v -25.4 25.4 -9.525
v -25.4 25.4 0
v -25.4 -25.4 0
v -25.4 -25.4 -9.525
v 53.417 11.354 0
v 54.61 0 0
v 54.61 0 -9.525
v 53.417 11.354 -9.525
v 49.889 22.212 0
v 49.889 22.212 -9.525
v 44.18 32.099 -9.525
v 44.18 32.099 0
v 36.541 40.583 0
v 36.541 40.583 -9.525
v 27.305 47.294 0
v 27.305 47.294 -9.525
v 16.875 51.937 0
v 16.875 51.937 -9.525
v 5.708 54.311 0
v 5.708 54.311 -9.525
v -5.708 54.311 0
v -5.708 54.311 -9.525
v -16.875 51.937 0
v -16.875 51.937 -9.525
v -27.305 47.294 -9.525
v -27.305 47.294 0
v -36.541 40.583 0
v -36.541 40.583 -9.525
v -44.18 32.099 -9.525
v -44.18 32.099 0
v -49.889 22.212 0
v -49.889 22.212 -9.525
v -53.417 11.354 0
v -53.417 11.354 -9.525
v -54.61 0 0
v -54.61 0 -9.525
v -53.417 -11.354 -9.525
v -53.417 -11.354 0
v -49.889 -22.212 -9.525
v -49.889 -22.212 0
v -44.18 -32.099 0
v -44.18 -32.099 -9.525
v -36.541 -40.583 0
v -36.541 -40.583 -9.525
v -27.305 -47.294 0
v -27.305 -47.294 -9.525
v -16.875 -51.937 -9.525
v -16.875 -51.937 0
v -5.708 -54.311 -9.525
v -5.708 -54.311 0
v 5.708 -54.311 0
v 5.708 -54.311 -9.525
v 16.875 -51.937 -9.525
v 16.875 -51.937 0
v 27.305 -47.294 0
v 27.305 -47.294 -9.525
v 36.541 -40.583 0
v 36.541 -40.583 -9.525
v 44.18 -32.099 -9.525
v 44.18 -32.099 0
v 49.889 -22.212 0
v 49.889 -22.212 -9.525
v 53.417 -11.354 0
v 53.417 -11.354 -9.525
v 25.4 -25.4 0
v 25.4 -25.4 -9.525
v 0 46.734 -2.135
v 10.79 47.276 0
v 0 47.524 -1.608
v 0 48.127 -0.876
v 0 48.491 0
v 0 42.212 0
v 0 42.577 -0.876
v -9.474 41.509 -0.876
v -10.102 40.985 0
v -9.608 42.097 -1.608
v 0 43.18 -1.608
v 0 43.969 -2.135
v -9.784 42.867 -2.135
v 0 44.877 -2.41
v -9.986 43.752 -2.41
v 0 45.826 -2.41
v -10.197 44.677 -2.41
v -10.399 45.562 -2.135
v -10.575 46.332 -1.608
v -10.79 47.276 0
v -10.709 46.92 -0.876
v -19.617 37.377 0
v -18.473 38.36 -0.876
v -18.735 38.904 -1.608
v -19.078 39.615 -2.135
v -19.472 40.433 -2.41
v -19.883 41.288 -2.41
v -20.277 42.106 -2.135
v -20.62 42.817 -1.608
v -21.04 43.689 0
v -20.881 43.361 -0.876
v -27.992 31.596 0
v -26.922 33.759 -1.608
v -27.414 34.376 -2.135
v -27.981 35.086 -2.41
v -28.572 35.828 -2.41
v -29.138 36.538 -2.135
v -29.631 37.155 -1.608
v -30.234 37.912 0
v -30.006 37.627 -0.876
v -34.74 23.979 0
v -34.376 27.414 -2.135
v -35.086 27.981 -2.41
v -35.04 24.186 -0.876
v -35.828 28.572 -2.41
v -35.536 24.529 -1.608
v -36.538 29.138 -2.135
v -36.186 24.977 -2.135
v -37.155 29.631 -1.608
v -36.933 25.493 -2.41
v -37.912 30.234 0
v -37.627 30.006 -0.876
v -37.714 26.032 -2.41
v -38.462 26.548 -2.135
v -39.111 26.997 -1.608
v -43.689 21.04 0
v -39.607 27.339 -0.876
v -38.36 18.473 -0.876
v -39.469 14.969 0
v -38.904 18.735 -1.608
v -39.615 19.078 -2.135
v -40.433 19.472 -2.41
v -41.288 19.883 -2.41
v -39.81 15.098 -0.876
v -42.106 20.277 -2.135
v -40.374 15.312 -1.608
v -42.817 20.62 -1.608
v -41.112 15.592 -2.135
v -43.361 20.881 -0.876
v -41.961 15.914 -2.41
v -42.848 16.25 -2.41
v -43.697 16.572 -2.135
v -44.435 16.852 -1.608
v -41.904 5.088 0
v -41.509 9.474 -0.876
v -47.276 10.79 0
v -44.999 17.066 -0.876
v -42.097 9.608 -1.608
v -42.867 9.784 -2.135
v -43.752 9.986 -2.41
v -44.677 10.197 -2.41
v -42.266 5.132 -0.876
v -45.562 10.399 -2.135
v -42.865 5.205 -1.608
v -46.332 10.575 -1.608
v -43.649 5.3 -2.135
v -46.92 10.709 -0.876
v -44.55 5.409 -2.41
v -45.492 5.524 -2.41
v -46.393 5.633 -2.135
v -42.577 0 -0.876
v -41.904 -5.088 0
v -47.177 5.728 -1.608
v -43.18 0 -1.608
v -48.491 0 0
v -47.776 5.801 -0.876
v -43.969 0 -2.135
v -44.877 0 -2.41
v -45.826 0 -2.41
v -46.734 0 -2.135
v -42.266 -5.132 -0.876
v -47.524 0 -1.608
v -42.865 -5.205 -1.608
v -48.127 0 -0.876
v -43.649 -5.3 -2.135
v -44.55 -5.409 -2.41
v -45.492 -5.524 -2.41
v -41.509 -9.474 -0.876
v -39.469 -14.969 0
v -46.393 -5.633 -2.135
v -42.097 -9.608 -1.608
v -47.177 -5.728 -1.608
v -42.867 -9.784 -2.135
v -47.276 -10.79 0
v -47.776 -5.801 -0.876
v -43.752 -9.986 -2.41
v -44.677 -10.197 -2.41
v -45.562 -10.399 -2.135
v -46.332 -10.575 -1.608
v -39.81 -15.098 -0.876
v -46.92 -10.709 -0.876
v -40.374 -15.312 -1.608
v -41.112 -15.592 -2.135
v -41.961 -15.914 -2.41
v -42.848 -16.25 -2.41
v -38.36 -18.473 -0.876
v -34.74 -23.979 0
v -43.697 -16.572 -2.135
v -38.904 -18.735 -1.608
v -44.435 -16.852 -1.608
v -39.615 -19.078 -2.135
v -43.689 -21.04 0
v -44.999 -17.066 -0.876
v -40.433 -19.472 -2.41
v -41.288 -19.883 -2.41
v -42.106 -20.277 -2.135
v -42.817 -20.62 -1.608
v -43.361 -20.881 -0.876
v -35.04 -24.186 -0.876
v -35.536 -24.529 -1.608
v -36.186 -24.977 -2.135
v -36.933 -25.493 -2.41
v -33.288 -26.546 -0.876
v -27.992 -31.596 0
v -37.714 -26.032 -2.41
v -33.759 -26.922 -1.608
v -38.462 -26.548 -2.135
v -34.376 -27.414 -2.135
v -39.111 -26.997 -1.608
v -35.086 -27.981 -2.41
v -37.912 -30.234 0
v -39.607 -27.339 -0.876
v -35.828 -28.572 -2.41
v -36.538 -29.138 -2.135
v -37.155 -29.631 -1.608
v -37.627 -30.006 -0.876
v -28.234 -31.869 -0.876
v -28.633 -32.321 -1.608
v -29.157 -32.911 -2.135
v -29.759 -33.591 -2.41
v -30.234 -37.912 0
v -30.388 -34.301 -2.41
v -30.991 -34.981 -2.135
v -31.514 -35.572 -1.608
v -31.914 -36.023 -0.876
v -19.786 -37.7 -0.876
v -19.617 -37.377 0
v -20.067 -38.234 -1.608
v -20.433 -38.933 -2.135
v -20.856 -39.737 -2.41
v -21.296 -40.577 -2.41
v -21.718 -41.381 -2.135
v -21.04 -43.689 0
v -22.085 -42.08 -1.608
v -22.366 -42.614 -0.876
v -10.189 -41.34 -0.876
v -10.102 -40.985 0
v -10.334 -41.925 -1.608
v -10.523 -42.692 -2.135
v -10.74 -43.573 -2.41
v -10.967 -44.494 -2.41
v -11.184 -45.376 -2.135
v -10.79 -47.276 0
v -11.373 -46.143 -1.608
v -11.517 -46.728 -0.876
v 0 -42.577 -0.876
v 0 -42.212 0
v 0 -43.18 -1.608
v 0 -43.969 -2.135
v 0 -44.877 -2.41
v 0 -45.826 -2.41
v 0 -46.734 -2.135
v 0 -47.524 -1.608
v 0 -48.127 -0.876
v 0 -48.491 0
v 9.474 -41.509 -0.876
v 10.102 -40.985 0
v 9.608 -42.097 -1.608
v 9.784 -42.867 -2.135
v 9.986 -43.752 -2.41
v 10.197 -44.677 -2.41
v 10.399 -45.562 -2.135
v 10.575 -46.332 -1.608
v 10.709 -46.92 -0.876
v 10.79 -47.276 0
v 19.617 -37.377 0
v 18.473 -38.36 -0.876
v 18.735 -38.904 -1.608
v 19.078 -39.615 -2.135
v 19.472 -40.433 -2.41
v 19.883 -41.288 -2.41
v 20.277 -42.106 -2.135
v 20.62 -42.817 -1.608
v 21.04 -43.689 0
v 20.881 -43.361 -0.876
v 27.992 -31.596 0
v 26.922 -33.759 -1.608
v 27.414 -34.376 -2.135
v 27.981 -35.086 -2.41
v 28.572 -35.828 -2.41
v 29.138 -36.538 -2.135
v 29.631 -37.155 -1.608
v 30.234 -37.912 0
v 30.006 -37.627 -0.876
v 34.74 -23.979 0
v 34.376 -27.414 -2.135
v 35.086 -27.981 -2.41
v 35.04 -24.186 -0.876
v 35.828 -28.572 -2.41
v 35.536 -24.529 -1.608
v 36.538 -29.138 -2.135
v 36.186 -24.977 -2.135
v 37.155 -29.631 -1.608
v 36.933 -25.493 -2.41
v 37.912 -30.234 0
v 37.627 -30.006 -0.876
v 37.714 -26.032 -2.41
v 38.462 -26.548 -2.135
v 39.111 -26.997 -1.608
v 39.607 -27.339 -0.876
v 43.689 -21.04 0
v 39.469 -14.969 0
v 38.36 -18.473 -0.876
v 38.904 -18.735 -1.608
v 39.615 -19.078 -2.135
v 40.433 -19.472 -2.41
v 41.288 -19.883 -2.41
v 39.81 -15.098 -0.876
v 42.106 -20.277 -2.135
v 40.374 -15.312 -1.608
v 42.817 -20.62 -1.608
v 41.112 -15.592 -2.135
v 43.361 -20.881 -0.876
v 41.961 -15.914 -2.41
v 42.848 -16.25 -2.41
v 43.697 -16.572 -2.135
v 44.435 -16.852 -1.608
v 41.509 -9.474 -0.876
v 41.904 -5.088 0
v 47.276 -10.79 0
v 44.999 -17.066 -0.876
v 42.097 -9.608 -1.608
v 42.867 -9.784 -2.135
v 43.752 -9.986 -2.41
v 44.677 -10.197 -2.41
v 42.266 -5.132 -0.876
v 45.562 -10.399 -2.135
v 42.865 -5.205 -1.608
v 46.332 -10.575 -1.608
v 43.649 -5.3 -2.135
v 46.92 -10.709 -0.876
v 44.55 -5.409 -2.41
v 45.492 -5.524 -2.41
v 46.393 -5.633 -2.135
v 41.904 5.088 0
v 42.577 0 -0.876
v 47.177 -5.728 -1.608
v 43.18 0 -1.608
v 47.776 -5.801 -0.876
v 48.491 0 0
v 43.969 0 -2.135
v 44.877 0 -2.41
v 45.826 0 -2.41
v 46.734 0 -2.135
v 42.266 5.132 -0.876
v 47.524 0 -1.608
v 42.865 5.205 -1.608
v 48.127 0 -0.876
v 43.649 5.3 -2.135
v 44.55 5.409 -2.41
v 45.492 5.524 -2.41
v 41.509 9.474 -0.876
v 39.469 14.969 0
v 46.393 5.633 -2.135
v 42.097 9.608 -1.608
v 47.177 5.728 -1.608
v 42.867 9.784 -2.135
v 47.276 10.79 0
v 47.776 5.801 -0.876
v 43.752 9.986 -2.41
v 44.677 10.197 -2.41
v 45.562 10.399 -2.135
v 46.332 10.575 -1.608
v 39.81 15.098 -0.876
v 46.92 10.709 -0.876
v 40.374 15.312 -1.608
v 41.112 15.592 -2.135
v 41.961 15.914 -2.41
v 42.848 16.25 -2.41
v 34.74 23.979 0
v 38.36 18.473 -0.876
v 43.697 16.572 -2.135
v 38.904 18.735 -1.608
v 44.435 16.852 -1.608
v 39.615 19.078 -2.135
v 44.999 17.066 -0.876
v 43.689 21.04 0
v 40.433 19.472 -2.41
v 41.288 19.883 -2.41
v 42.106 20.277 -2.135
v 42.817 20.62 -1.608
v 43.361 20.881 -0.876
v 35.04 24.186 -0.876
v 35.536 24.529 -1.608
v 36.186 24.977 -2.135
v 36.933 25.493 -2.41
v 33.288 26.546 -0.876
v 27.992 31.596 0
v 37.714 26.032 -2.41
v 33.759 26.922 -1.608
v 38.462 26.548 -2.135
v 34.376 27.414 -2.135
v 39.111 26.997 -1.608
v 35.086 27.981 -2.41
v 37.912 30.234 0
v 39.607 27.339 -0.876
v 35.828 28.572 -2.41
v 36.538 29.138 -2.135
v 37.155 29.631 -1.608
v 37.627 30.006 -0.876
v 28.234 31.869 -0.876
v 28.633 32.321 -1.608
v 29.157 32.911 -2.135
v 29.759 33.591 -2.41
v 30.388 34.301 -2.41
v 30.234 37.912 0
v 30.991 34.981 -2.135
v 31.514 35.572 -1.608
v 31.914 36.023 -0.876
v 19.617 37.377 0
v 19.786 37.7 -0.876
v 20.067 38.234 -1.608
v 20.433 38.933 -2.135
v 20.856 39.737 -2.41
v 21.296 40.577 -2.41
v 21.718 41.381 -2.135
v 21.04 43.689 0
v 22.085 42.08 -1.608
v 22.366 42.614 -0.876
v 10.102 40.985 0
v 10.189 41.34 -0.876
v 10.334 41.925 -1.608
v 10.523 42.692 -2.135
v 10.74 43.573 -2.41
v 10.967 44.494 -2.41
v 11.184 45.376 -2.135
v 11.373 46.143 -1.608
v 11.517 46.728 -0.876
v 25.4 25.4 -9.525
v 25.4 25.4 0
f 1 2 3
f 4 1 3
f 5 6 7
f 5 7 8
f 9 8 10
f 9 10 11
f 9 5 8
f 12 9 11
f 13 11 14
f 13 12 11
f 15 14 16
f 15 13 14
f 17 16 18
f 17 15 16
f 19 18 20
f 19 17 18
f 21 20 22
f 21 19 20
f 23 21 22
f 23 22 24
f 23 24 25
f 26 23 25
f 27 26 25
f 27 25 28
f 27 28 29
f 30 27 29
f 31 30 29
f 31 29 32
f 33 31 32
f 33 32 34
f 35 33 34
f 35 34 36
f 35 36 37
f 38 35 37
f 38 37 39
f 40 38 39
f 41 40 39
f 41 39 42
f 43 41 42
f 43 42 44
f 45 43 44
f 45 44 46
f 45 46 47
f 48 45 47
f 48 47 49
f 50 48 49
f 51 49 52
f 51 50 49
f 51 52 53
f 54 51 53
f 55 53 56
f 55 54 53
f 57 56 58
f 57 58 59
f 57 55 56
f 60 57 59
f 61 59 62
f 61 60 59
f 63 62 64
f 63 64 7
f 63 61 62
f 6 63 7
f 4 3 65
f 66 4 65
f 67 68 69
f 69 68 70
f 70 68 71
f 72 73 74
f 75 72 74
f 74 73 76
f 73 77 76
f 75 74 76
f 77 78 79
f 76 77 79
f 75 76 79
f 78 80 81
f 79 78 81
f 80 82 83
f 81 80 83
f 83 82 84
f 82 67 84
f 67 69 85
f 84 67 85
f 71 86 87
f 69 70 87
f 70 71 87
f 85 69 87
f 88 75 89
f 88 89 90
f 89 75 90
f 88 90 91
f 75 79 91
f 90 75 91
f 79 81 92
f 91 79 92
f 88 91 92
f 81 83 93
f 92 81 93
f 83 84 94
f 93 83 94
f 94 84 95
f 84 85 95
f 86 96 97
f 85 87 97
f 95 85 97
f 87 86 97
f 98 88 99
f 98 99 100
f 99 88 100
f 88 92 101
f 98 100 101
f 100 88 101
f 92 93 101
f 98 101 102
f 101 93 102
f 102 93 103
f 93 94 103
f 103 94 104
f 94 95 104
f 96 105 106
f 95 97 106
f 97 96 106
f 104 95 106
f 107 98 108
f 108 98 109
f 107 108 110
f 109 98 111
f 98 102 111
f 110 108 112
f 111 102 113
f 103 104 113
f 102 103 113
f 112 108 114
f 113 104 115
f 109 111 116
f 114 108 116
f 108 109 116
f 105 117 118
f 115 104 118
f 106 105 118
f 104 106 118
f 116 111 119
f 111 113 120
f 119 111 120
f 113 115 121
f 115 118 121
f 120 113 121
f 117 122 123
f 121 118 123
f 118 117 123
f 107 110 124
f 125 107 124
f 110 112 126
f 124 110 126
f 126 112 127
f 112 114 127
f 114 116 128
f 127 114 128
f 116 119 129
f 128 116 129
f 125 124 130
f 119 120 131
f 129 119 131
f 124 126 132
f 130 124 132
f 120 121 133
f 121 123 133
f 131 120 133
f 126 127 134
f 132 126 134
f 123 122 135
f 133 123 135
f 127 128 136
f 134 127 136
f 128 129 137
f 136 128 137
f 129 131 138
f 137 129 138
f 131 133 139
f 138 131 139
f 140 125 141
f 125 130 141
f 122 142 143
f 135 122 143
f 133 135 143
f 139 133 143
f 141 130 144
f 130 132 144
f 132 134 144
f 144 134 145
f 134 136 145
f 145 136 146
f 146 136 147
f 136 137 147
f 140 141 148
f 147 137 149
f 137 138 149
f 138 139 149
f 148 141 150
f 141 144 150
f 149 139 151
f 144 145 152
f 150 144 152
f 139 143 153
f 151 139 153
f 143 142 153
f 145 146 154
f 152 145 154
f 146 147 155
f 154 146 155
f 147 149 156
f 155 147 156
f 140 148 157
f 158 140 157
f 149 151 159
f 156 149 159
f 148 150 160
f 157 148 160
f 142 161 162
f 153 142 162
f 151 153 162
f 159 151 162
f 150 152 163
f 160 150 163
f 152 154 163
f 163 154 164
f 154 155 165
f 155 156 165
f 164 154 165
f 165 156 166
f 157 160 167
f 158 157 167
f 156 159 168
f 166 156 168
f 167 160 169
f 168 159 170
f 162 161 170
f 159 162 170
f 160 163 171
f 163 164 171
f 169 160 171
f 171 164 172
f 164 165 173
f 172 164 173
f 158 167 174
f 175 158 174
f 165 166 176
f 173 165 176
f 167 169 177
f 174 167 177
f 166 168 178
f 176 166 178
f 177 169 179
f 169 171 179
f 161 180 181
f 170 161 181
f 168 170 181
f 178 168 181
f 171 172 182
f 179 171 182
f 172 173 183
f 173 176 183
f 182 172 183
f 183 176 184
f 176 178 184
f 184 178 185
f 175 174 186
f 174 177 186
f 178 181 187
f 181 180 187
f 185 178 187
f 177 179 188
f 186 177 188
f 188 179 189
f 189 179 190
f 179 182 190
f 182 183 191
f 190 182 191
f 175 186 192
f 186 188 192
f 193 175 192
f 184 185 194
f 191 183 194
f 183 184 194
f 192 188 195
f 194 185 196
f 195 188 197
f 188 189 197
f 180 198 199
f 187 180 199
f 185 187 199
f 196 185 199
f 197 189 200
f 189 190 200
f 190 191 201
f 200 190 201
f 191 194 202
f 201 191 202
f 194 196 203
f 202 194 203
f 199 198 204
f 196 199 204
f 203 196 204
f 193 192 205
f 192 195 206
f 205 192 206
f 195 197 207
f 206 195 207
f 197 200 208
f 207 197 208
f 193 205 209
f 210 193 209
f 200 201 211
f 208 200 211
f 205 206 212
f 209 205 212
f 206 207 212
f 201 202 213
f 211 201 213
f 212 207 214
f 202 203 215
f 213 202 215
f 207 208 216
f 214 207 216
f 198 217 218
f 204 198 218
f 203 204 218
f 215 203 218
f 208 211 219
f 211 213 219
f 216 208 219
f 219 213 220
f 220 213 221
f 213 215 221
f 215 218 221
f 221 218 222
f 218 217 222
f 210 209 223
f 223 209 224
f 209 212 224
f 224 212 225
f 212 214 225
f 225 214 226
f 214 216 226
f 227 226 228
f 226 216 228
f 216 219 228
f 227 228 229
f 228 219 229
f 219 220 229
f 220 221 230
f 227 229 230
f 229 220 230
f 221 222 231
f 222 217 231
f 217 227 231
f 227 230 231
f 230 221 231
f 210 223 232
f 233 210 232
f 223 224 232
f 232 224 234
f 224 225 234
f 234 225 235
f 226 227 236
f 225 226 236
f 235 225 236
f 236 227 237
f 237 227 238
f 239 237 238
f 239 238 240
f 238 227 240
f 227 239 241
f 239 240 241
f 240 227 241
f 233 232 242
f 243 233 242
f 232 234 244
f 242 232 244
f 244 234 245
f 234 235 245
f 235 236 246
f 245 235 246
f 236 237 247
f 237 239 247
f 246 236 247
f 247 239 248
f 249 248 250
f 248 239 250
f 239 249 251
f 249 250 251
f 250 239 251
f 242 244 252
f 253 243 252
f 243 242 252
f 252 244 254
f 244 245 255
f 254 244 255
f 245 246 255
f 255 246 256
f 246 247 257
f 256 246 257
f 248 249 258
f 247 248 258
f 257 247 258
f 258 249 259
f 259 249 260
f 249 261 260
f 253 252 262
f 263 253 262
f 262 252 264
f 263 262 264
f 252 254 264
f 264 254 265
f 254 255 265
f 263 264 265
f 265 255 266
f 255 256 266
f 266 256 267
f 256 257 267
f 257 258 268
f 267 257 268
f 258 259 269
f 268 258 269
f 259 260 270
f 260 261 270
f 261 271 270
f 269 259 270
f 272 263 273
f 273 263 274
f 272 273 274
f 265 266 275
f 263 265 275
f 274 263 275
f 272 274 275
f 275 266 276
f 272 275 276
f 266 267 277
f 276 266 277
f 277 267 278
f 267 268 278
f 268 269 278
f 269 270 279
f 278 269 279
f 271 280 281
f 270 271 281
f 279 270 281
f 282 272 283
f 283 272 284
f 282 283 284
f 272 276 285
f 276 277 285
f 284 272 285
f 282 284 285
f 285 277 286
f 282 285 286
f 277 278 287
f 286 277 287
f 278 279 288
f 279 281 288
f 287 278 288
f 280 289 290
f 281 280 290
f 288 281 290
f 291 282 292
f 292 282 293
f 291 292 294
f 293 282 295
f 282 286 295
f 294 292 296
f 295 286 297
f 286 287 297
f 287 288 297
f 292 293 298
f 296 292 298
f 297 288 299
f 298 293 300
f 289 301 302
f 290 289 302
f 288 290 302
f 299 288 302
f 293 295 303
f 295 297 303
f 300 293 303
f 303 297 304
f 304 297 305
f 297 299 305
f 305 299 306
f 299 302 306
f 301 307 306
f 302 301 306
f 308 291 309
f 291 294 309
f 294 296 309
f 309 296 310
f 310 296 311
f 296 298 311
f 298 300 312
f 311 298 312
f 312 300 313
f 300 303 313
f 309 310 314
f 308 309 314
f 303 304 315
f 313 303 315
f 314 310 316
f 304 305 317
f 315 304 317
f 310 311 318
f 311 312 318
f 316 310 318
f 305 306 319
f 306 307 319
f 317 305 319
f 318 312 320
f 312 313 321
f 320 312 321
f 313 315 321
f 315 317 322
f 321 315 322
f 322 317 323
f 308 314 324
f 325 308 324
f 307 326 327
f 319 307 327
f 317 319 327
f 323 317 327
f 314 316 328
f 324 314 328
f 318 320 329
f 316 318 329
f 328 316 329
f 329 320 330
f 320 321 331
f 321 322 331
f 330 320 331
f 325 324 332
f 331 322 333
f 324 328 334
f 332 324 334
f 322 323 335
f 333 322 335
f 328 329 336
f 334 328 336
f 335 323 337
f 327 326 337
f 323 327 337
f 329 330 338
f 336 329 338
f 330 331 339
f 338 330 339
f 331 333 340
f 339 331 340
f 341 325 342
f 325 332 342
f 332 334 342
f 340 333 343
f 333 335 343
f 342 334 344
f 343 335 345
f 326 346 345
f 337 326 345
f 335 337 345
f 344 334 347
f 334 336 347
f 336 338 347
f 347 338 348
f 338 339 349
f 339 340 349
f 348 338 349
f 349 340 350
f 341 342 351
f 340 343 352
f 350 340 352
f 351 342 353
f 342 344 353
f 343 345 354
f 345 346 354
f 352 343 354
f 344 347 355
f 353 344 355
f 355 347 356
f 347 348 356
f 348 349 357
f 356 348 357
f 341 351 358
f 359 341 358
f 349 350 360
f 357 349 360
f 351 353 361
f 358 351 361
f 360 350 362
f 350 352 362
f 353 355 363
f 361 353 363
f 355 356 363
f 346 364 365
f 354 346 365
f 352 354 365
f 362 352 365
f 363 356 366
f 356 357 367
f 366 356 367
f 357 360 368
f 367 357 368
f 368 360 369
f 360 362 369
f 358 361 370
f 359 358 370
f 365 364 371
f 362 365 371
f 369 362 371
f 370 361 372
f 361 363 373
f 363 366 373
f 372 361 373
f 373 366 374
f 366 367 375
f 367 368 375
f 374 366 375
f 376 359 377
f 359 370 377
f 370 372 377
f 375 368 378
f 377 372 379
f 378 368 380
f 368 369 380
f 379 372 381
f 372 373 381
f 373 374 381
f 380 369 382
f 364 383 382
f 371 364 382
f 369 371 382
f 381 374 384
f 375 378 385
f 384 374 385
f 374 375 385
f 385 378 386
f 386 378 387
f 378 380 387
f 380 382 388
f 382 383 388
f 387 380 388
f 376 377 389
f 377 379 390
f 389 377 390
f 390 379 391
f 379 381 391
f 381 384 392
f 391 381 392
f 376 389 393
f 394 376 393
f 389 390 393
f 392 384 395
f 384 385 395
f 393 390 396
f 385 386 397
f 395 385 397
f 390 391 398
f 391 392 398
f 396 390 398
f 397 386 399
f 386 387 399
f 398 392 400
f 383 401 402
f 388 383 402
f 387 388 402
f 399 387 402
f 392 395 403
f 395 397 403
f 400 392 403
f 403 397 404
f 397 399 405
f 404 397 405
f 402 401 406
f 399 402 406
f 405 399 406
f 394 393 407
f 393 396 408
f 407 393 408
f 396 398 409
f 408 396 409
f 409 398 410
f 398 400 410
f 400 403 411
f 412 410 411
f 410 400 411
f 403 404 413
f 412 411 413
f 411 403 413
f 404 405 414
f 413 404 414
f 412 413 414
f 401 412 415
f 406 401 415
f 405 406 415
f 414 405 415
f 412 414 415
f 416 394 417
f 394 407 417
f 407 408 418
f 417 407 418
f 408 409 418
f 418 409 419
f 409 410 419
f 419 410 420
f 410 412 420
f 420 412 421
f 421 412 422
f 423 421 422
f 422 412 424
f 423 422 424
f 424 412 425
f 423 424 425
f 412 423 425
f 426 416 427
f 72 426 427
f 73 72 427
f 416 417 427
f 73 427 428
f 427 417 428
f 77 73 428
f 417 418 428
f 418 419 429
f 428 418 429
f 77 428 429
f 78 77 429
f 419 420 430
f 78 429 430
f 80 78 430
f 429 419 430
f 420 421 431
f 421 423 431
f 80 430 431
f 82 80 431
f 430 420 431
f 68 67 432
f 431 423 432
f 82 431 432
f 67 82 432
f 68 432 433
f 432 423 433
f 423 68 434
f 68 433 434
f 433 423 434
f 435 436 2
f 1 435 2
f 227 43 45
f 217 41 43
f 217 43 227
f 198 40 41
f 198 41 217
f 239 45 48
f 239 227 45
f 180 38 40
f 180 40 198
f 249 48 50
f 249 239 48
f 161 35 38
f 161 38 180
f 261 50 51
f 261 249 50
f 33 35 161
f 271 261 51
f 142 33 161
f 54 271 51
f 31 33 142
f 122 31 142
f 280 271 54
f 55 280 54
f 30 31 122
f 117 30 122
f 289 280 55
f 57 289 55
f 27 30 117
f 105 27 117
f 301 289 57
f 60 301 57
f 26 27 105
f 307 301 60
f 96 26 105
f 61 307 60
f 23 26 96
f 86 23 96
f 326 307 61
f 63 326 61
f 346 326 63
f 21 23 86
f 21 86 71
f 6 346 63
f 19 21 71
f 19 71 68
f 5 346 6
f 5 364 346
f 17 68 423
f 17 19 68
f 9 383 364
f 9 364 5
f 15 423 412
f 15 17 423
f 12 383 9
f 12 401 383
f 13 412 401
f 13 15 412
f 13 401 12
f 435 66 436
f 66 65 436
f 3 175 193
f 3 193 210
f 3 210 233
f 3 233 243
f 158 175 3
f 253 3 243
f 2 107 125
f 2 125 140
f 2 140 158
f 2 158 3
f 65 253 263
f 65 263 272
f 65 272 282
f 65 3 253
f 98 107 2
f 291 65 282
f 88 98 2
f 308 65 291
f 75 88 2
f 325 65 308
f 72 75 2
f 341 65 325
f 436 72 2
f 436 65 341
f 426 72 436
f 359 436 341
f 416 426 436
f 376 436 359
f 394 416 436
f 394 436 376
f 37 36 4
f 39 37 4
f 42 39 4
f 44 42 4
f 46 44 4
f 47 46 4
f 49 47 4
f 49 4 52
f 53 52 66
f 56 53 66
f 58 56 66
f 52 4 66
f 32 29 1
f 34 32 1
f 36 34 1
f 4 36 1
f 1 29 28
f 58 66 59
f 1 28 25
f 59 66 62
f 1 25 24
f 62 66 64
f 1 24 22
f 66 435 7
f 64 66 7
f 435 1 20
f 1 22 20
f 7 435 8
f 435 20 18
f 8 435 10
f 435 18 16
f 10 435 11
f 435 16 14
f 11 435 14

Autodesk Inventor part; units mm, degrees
ref_plane "YZ Plane" through (0, 0, 0) normal (1, 0, 0) x (0, 1, 0)
ref_plane "XZ Plane" through (0, 0, 0) normal (0, 1, 0) x (-1, 0, 0)
ref_plane "XY Plane" through (0, 0, 0) normal (0, 0, 1) x (1, 0, 0)
sketch "Sketch1" plane through (0, 0, 0) normal (0, 0, 1) x (1, 0, 0)
  circle A0 centre (0, 0) radius 48.5902 construction
  circle A1 centre (0, 0) radius 42.1132 construction
  circle A2 centre (0, 0) radius 54.61
  circle A3 centre (0, 0) radius 51.7652 construction
  line L0 (0, 0) -> (0, 45.3517) construction
  line L1 (-25.4, -25.4) -> (25.4, -25.4)
  line L2 (25.4, -25.4) -> (25.4, 25.4)
  line L3 (25.4, 25.4) -> (-25.4, 25.4)
  line L4 (-25.4, 25.4) -> (-25.4, -25.4)
  line L5 (-25.4, -25.4) -> (25.4, 25.4) construction
  line L6 (25.4, -25.4) -> (-25.4, 25.4) construction
  dimension "d0" = 97.1804
  dimension "d1" = 84.2264
  dimension "d2" = 109.22
  dimension "d3" = 103.5304
  dimension "d15" = 45.3517
  dimension "d22" = 50.8
  dimension "d23" = 50.8
sketch "Sketch2" plane through (0, 0, 0) normal (1, 0, 0) x (0, 1, 0)
  line L0 (0, 0) -> (45.3517, 0) construction
  line L1 (45.3517, 0) -> (45.3517, 0.7937) construction
  circle A0 centre (45.3517, 0.7937) radius 3.2385
  line L2 (0, 0) -> (0, 25.4) construction
  dimension "d16" = 6.477
  dimension "d17" = 0.7937
  dimension "d18" = 25.4
extrude "Extrusion2" add sketch "Sketch1" against normal blind 9.525
revolve "Revolution2" cut sketch "Sketch2" angle 360 about axis through (0, 0, 0) along (0, 0, 1)
equation "\"d15\" = 0.25 * d1 + 0.25 * d0"
properties part number "Base Gear" material "Aluminum 6061"
